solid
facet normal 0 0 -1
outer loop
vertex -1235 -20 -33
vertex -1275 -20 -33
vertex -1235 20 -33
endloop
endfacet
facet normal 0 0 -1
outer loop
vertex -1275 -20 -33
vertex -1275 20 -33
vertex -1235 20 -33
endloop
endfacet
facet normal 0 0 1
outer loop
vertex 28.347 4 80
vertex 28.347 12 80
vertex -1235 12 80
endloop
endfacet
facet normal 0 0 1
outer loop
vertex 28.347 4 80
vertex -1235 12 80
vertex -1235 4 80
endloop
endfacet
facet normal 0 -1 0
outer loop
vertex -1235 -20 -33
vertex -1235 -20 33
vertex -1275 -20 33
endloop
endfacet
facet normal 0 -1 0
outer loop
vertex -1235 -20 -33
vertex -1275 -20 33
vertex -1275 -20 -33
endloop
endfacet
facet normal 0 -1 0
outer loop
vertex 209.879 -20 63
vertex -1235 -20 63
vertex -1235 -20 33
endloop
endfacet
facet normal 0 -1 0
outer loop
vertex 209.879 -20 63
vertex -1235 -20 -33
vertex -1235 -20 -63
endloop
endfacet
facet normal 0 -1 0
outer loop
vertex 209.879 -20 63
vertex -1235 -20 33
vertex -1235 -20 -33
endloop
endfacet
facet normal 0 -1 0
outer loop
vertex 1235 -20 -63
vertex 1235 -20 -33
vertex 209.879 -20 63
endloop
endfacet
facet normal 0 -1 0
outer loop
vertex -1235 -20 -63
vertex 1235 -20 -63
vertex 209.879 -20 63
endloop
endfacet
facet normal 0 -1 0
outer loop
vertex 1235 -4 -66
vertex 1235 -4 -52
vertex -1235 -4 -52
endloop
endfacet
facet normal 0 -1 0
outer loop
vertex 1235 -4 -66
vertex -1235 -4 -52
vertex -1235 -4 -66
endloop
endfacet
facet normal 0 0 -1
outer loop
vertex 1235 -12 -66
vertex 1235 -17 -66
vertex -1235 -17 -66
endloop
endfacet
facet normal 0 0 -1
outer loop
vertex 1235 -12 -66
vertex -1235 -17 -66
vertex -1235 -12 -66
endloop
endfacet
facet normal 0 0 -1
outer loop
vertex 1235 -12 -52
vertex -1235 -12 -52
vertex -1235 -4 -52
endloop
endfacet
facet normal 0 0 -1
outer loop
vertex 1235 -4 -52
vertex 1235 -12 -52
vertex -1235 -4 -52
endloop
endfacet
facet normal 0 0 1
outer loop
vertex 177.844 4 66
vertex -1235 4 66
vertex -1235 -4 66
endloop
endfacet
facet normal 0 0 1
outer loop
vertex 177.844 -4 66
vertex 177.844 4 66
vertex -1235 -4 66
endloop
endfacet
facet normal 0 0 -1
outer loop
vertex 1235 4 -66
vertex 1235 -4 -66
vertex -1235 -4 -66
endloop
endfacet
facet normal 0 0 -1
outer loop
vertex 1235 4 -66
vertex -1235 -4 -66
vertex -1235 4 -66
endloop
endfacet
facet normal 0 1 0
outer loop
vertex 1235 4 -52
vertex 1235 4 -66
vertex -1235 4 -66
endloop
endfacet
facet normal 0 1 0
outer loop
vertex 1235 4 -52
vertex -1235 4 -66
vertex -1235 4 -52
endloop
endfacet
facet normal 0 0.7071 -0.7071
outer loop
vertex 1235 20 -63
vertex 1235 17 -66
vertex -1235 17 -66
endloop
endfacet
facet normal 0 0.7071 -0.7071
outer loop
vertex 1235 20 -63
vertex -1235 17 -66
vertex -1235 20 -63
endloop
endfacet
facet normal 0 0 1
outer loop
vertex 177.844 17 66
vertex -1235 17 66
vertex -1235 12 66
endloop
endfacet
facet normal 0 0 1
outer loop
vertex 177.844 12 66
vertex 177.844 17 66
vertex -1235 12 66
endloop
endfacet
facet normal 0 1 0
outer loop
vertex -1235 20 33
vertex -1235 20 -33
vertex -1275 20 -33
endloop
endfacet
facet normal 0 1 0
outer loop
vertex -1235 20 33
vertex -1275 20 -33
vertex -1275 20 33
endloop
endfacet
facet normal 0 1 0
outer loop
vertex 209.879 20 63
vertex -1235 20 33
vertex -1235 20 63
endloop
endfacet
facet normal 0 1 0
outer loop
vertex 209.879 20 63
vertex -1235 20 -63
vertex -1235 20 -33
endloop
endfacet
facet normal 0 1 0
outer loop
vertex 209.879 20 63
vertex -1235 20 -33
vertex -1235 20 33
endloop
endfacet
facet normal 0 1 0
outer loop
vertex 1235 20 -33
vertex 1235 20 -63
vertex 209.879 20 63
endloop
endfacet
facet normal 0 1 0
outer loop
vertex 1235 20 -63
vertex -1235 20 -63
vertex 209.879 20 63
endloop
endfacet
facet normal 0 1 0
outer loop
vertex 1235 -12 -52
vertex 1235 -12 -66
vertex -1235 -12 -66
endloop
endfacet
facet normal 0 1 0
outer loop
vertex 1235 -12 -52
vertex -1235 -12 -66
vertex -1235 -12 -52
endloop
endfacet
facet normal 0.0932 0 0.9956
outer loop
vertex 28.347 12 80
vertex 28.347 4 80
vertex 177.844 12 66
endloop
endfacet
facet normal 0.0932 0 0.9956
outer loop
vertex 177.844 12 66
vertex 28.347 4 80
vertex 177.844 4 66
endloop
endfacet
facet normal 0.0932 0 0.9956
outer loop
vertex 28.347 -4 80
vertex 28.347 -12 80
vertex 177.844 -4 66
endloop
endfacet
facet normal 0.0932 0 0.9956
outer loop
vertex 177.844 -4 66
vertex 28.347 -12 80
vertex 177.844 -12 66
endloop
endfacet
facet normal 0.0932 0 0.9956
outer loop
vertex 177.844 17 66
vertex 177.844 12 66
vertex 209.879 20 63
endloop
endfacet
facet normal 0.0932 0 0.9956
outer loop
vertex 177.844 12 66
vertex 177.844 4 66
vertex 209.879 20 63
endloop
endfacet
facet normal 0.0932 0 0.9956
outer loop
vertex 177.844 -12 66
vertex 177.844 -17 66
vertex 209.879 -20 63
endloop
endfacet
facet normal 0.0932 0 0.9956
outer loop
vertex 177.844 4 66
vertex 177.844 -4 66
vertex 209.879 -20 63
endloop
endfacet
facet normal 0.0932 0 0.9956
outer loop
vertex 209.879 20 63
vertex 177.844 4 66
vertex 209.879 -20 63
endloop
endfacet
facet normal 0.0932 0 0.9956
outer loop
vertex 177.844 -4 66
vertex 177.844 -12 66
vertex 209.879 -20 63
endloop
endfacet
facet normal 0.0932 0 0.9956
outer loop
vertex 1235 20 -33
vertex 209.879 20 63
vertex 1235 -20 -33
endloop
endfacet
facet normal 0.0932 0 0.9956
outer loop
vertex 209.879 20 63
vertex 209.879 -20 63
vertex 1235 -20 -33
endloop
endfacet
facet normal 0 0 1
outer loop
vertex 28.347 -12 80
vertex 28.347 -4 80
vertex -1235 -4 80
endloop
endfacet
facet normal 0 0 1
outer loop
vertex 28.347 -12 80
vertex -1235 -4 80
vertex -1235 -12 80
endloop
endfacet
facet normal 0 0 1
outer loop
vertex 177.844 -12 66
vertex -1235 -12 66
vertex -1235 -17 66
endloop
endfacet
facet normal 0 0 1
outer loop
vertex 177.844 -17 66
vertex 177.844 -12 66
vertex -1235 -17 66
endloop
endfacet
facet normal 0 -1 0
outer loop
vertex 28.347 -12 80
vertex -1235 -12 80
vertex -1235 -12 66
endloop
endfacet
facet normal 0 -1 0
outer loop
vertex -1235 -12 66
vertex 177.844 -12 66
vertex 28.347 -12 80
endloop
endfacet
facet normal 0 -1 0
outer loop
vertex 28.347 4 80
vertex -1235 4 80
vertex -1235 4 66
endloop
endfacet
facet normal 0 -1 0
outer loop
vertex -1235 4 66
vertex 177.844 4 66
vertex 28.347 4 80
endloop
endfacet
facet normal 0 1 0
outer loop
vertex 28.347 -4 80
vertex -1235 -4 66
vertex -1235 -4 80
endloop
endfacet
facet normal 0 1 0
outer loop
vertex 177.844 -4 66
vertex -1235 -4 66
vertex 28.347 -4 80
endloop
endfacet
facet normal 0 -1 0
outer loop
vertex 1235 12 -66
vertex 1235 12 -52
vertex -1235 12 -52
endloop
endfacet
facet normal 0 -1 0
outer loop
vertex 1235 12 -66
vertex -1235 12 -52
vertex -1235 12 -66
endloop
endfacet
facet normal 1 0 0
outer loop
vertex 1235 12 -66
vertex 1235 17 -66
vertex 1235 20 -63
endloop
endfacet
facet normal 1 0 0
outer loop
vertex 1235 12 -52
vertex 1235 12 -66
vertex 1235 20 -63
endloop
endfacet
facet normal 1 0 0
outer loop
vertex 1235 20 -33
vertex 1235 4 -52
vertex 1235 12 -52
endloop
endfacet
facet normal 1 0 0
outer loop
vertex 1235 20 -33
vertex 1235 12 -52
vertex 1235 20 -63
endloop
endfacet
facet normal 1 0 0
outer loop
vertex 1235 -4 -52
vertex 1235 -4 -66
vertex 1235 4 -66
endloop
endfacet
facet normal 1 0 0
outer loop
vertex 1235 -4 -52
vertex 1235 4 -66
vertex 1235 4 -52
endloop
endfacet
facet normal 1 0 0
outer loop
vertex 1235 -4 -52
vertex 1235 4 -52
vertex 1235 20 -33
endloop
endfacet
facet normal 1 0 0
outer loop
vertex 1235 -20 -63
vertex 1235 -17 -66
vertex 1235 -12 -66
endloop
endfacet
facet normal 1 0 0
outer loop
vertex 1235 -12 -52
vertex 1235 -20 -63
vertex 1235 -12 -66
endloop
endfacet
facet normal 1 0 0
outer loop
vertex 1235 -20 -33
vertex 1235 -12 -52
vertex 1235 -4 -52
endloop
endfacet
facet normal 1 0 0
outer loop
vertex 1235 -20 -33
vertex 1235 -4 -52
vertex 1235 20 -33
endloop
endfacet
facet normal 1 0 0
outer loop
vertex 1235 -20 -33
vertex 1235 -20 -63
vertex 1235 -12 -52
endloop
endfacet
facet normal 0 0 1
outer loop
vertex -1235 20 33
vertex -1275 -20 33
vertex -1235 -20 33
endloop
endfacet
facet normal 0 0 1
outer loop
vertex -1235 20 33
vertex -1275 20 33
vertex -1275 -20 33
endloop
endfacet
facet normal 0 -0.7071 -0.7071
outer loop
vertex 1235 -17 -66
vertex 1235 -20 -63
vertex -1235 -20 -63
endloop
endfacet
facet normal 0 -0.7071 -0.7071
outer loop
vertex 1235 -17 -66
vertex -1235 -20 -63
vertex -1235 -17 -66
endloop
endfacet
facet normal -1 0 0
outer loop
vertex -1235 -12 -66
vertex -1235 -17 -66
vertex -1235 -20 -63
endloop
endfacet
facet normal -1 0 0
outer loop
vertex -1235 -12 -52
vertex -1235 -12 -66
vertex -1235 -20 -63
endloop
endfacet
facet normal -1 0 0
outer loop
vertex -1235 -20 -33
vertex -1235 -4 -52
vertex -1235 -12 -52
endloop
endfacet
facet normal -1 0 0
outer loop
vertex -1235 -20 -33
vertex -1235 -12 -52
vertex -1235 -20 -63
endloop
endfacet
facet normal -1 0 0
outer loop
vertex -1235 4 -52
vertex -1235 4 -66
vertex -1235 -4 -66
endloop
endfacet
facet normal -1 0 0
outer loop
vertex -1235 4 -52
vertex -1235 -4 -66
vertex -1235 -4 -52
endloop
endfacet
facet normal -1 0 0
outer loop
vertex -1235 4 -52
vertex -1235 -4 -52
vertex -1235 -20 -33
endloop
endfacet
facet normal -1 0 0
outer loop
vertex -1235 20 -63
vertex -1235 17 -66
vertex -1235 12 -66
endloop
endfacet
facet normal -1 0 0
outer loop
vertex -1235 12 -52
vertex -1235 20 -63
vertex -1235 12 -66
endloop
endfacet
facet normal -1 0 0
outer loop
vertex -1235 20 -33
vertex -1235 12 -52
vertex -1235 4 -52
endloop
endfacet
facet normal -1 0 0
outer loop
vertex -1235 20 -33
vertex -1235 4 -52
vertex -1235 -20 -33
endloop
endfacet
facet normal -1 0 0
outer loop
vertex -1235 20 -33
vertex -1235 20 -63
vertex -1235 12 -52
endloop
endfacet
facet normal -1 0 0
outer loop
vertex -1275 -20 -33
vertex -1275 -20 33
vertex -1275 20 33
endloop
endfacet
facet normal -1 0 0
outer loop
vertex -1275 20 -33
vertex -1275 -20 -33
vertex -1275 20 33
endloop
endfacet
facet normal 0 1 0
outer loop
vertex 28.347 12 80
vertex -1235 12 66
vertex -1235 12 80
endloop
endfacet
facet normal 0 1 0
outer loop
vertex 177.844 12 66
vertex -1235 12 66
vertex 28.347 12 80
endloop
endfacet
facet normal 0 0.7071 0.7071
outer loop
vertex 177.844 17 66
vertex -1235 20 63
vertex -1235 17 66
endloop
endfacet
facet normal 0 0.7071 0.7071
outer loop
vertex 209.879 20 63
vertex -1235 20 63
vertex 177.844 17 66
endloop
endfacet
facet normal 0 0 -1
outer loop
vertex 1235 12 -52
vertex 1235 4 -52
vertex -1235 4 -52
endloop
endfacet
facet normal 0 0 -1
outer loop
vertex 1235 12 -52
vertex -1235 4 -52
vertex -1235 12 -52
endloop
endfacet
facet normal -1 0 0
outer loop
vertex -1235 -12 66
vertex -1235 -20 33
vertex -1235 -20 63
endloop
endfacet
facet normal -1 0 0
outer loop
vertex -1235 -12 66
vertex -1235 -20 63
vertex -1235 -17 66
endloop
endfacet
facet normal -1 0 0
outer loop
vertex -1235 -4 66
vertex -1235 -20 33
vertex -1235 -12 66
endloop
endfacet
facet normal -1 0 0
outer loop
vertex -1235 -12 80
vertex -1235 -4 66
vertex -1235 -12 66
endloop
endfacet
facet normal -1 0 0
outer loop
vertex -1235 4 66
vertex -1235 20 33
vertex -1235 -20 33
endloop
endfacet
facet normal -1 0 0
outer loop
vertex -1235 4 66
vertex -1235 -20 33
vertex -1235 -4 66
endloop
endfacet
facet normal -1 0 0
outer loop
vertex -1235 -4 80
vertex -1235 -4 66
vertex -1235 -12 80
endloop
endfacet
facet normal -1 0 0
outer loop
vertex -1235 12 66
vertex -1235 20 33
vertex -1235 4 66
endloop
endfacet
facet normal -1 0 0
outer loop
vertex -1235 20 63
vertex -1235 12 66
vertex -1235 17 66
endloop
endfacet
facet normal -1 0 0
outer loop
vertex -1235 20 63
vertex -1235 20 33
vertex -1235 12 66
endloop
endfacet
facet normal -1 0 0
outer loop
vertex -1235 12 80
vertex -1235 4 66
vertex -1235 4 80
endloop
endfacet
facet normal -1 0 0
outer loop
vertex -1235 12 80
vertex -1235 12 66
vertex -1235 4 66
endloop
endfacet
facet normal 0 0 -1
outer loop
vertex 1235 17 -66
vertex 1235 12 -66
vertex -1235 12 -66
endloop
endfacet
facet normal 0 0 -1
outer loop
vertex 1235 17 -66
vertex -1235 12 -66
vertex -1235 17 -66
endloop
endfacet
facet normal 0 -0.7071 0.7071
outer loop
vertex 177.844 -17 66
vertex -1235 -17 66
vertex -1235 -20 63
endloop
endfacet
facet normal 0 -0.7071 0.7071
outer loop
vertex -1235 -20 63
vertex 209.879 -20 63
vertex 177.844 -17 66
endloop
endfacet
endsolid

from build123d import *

# Parameters (mm, degrees)
F1_W     = 40
F1_H     = 33
F3_DEPTH = 1275
F2_W     = 80
F2_H     = 100
F4_DEPTH = 25
F6_DEPTH = 25


with BuildPart() as f3:
    # F1 (on Right) → F3 (new body, symmetric)
    with BuildSketch(Plane.YZ):
        Polygon((20, 33), (20, 63), (17, 66), (12, 66), (12, 80), (4, 80), (4, 66), (-4, 66), (-4, 80), (-12, 80), (-12, 66), (-17, 66), (-20, 63), (-20, 33), align=None)
        with Locations((0, 16.5)):
            Rectangle(F1_W, F1_H)
        with Locations((0, -16.5)):
            Rectangle(F1_W, F1_H)
        Polygon((20, -63), (20, -33), (-20, -33), (-20, -63), (-17, -66), (-12, -66), (-12, -52), (-4, -52), (-4, -66), (4, -66), (4, -52), (12, -52), (12, -66), (17, -66), align=None)
    extrude(amount=F3_DEPTH, both=True)

    # F2 (on Front) → F4 (cut, symmetric)
    with BuildSketch(Plane.XZ):
        with Locations((-1275, 83)):
            Rectangle(F2_W, F2_H)
        with Locations((-1275, -83)):
            Rectangle(F2_W, F2_H)
        with Locations((1275, 83)):
            Rectangle(F2_W, F2_H)
        with Locations((1275, -83)):
            Rectangle(F2_W, F2_H)
    extrude(amount=F4_DEPTH, both=True, mode=Mode.SUBTRACT)

    # F5 (on Front) → F6 (cut, symmetric)
    with BuildSketch(Plane.XZ):
        Polygon((1375, 140.368329996), (-616.2874210137, 140.368329996), (1375, -46.110641775), align=None)
    extrude(amount=F6_DEPTH, both=True, mode=Mode.SUBTRACT)


solid = f3.part
